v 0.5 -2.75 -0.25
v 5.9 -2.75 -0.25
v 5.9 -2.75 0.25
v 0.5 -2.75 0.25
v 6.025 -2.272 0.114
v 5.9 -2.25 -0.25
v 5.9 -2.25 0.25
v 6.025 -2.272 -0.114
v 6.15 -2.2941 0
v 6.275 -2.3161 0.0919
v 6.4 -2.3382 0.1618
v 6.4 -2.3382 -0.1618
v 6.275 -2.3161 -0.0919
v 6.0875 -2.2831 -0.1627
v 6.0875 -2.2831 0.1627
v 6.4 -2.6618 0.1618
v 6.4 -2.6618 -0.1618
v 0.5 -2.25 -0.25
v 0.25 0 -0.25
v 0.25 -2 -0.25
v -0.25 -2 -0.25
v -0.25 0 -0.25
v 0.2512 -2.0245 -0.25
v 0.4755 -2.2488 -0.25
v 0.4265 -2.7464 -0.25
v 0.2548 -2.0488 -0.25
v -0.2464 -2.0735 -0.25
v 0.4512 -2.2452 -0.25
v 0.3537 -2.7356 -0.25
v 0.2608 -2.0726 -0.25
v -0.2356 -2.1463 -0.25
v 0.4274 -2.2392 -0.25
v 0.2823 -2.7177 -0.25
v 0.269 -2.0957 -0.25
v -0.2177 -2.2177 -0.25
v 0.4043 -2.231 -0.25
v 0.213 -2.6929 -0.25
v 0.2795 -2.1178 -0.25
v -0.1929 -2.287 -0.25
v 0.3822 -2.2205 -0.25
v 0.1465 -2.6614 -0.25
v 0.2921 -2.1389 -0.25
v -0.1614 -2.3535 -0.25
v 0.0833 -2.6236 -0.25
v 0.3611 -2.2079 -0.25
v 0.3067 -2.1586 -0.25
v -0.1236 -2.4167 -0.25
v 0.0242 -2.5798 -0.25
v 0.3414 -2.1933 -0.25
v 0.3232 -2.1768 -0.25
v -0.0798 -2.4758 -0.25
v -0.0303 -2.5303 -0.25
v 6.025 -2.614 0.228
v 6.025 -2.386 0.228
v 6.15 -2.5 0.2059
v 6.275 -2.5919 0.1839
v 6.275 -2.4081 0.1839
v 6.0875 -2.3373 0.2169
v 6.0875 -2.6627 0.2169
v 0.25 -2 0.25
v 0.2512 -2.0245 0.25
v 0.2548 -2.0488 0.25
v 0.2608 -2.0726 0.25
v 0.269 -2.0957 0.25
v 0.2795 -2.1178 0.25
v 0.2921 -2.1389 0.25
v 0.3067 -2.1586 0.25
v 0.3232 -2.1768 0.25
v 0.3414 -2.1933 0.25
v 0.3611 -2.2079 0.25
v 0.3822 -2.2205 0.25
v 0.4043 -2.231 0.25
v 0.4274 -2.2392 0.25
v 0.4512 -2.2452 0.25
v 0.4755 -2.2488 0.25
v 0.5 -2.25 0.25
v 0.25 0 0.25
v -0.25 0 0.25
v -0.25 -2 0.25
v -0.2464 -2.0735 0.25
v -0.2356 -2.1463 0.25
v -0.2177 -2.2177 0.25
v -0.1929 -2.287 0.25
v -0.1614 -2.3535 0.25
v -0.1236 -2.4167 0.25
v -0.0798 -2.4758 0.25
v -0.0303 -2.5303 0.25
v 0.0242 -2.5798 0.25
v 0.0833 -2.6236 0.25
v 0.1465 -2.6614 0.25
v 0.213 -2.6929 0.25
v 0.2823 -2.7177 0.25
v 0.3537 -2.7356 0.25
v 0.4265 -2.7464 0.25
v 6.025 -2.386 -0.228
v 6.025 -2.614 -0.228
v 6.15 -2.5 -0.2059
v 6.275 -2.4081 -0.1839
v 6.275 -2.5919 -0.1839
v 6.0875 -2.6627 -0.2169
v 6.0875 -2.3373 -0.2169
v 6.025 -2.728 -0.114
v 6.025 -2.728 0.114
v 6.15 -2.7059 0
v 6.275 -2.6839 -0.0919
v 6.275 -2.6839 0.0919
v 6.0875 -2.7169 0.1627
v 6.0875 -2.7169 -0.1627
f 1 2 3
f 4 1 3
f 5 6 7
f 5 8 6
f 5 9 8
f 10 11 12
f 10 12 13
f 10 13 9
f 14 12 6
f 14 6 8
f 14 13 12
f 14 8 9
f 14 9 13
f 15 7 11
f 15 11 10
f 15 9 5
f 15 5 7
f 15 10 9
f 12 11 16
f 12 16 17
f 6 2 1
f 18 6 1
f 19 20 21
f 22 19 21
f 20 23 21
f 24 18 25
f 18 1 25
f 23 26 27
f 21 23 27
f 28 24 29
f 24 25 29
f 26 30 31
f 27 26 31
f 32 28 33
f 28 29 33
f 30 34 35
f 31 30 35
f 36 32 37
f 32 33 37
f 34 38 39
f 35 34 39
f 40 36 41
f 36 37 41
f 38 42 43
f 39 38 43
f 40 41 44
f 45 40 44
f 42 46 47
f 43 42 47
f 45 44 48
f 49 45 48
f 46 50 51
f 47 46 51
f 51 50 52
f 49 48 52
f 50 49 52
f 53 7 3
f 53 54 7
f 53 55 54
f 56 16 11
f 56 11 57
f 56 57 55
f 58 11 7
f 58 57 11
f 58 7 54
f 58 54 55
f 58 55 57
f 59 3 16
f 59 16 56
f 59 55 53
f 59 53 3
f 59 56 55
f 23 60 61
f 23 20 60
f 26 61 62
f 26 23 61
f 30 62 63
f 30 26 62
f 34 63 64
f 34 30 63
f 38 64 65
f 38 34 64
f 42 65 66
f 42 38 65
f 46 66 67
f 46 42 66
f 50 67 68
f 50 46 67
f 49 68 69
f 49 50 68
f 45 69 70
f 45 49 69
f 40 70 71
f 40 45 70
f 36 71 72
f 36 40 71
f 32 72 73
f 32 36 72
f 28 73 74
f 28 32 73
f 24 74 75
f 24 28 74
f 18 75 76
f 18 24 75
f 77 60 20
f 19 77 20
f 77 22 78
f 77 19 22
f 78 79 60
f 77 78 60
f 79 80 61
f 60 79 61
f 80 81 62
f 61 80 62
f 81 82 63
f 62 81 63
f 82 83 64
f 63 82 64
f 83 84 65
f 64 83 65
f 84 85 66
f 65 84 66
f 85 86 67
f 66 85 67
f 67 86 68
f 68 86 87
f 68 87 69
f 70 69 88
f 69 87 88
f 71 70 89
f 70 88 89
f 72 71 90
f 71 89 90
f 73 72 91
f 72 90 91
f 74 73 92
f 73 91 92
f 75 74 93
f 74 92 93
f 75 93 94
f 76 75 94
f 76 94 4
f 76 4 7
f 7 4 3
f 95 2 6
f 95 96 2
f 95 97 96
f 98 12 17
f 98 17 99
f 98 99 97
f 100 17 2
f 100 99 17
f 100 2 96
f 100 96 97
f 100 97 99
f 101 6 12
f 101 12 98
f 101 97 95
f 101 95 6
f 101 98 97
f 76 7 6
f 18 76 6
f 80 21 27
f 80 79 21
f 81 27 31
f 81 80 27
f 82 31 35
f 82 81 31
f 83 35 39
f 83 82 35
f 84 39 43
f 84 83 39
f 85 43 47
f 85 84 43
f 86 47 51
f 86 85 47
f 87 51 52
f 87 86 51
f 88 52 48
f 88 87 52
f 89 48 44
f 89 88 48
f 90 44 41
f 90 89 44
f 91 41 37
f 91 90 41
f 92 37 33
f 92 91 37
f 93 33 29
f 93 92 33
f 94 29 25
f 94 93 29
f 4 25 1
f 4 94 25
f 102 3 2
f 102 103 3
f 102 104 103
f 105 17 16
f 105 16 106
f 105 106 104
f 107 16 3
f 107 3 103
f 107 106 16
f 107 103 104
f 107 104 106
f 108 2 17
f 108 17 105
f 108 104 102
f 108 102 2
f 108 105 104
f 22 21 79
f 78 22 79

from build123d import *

# Parameters (mm, degrees)
SKETCH1_W           = 0.5
SKETCH1_H           = 0.5
SKETCH4_W           = 0.5
SKETCH4_H           = 0.5
BOSS_EXTRUDE1_DEPTH = 0.5
BOSS_EXTRUDE1_TAPER = 10


with BuildPart() as part:
    # Sweep1: sweep along a path in Sketch2
    with BuildLine(Plane.XY) as sweep1_path:
        Line((0, 0), (0, -2))
        ThreePointArc((0, -2), (0.146446609, -2.353553391), (0.5, -2.5))
        Line((0.5, -2.5), (5.9, -2.5))
    # Sketch1 → Sweep1 (sweep)
    with BuildSketch(Plane(origin=(0, 0, 0), x_dir=(1, 0, 0), z_dir=(0, 1, 0))):
        Rectangle(SKETCH1_W, SKETCH1_H)
    sweep(path=sweep1_path.line)

    # Sketch4 → Boss-Extrude1 (add)
    with BuildSketch(Plane(origin=(5.9, 0, 0), x_dir=(0, 0, -1), z_dir=(1, 0, 0))):
        with Locations((0, -2.5)):
            Rectangle(SKETCH4_W, SKETCH4_H)
    extrude(amount=BOSS_EXTRUDE1_DEPTH, taper=BOSS_EXTRUDE1_TAPER)


solid = part.part
